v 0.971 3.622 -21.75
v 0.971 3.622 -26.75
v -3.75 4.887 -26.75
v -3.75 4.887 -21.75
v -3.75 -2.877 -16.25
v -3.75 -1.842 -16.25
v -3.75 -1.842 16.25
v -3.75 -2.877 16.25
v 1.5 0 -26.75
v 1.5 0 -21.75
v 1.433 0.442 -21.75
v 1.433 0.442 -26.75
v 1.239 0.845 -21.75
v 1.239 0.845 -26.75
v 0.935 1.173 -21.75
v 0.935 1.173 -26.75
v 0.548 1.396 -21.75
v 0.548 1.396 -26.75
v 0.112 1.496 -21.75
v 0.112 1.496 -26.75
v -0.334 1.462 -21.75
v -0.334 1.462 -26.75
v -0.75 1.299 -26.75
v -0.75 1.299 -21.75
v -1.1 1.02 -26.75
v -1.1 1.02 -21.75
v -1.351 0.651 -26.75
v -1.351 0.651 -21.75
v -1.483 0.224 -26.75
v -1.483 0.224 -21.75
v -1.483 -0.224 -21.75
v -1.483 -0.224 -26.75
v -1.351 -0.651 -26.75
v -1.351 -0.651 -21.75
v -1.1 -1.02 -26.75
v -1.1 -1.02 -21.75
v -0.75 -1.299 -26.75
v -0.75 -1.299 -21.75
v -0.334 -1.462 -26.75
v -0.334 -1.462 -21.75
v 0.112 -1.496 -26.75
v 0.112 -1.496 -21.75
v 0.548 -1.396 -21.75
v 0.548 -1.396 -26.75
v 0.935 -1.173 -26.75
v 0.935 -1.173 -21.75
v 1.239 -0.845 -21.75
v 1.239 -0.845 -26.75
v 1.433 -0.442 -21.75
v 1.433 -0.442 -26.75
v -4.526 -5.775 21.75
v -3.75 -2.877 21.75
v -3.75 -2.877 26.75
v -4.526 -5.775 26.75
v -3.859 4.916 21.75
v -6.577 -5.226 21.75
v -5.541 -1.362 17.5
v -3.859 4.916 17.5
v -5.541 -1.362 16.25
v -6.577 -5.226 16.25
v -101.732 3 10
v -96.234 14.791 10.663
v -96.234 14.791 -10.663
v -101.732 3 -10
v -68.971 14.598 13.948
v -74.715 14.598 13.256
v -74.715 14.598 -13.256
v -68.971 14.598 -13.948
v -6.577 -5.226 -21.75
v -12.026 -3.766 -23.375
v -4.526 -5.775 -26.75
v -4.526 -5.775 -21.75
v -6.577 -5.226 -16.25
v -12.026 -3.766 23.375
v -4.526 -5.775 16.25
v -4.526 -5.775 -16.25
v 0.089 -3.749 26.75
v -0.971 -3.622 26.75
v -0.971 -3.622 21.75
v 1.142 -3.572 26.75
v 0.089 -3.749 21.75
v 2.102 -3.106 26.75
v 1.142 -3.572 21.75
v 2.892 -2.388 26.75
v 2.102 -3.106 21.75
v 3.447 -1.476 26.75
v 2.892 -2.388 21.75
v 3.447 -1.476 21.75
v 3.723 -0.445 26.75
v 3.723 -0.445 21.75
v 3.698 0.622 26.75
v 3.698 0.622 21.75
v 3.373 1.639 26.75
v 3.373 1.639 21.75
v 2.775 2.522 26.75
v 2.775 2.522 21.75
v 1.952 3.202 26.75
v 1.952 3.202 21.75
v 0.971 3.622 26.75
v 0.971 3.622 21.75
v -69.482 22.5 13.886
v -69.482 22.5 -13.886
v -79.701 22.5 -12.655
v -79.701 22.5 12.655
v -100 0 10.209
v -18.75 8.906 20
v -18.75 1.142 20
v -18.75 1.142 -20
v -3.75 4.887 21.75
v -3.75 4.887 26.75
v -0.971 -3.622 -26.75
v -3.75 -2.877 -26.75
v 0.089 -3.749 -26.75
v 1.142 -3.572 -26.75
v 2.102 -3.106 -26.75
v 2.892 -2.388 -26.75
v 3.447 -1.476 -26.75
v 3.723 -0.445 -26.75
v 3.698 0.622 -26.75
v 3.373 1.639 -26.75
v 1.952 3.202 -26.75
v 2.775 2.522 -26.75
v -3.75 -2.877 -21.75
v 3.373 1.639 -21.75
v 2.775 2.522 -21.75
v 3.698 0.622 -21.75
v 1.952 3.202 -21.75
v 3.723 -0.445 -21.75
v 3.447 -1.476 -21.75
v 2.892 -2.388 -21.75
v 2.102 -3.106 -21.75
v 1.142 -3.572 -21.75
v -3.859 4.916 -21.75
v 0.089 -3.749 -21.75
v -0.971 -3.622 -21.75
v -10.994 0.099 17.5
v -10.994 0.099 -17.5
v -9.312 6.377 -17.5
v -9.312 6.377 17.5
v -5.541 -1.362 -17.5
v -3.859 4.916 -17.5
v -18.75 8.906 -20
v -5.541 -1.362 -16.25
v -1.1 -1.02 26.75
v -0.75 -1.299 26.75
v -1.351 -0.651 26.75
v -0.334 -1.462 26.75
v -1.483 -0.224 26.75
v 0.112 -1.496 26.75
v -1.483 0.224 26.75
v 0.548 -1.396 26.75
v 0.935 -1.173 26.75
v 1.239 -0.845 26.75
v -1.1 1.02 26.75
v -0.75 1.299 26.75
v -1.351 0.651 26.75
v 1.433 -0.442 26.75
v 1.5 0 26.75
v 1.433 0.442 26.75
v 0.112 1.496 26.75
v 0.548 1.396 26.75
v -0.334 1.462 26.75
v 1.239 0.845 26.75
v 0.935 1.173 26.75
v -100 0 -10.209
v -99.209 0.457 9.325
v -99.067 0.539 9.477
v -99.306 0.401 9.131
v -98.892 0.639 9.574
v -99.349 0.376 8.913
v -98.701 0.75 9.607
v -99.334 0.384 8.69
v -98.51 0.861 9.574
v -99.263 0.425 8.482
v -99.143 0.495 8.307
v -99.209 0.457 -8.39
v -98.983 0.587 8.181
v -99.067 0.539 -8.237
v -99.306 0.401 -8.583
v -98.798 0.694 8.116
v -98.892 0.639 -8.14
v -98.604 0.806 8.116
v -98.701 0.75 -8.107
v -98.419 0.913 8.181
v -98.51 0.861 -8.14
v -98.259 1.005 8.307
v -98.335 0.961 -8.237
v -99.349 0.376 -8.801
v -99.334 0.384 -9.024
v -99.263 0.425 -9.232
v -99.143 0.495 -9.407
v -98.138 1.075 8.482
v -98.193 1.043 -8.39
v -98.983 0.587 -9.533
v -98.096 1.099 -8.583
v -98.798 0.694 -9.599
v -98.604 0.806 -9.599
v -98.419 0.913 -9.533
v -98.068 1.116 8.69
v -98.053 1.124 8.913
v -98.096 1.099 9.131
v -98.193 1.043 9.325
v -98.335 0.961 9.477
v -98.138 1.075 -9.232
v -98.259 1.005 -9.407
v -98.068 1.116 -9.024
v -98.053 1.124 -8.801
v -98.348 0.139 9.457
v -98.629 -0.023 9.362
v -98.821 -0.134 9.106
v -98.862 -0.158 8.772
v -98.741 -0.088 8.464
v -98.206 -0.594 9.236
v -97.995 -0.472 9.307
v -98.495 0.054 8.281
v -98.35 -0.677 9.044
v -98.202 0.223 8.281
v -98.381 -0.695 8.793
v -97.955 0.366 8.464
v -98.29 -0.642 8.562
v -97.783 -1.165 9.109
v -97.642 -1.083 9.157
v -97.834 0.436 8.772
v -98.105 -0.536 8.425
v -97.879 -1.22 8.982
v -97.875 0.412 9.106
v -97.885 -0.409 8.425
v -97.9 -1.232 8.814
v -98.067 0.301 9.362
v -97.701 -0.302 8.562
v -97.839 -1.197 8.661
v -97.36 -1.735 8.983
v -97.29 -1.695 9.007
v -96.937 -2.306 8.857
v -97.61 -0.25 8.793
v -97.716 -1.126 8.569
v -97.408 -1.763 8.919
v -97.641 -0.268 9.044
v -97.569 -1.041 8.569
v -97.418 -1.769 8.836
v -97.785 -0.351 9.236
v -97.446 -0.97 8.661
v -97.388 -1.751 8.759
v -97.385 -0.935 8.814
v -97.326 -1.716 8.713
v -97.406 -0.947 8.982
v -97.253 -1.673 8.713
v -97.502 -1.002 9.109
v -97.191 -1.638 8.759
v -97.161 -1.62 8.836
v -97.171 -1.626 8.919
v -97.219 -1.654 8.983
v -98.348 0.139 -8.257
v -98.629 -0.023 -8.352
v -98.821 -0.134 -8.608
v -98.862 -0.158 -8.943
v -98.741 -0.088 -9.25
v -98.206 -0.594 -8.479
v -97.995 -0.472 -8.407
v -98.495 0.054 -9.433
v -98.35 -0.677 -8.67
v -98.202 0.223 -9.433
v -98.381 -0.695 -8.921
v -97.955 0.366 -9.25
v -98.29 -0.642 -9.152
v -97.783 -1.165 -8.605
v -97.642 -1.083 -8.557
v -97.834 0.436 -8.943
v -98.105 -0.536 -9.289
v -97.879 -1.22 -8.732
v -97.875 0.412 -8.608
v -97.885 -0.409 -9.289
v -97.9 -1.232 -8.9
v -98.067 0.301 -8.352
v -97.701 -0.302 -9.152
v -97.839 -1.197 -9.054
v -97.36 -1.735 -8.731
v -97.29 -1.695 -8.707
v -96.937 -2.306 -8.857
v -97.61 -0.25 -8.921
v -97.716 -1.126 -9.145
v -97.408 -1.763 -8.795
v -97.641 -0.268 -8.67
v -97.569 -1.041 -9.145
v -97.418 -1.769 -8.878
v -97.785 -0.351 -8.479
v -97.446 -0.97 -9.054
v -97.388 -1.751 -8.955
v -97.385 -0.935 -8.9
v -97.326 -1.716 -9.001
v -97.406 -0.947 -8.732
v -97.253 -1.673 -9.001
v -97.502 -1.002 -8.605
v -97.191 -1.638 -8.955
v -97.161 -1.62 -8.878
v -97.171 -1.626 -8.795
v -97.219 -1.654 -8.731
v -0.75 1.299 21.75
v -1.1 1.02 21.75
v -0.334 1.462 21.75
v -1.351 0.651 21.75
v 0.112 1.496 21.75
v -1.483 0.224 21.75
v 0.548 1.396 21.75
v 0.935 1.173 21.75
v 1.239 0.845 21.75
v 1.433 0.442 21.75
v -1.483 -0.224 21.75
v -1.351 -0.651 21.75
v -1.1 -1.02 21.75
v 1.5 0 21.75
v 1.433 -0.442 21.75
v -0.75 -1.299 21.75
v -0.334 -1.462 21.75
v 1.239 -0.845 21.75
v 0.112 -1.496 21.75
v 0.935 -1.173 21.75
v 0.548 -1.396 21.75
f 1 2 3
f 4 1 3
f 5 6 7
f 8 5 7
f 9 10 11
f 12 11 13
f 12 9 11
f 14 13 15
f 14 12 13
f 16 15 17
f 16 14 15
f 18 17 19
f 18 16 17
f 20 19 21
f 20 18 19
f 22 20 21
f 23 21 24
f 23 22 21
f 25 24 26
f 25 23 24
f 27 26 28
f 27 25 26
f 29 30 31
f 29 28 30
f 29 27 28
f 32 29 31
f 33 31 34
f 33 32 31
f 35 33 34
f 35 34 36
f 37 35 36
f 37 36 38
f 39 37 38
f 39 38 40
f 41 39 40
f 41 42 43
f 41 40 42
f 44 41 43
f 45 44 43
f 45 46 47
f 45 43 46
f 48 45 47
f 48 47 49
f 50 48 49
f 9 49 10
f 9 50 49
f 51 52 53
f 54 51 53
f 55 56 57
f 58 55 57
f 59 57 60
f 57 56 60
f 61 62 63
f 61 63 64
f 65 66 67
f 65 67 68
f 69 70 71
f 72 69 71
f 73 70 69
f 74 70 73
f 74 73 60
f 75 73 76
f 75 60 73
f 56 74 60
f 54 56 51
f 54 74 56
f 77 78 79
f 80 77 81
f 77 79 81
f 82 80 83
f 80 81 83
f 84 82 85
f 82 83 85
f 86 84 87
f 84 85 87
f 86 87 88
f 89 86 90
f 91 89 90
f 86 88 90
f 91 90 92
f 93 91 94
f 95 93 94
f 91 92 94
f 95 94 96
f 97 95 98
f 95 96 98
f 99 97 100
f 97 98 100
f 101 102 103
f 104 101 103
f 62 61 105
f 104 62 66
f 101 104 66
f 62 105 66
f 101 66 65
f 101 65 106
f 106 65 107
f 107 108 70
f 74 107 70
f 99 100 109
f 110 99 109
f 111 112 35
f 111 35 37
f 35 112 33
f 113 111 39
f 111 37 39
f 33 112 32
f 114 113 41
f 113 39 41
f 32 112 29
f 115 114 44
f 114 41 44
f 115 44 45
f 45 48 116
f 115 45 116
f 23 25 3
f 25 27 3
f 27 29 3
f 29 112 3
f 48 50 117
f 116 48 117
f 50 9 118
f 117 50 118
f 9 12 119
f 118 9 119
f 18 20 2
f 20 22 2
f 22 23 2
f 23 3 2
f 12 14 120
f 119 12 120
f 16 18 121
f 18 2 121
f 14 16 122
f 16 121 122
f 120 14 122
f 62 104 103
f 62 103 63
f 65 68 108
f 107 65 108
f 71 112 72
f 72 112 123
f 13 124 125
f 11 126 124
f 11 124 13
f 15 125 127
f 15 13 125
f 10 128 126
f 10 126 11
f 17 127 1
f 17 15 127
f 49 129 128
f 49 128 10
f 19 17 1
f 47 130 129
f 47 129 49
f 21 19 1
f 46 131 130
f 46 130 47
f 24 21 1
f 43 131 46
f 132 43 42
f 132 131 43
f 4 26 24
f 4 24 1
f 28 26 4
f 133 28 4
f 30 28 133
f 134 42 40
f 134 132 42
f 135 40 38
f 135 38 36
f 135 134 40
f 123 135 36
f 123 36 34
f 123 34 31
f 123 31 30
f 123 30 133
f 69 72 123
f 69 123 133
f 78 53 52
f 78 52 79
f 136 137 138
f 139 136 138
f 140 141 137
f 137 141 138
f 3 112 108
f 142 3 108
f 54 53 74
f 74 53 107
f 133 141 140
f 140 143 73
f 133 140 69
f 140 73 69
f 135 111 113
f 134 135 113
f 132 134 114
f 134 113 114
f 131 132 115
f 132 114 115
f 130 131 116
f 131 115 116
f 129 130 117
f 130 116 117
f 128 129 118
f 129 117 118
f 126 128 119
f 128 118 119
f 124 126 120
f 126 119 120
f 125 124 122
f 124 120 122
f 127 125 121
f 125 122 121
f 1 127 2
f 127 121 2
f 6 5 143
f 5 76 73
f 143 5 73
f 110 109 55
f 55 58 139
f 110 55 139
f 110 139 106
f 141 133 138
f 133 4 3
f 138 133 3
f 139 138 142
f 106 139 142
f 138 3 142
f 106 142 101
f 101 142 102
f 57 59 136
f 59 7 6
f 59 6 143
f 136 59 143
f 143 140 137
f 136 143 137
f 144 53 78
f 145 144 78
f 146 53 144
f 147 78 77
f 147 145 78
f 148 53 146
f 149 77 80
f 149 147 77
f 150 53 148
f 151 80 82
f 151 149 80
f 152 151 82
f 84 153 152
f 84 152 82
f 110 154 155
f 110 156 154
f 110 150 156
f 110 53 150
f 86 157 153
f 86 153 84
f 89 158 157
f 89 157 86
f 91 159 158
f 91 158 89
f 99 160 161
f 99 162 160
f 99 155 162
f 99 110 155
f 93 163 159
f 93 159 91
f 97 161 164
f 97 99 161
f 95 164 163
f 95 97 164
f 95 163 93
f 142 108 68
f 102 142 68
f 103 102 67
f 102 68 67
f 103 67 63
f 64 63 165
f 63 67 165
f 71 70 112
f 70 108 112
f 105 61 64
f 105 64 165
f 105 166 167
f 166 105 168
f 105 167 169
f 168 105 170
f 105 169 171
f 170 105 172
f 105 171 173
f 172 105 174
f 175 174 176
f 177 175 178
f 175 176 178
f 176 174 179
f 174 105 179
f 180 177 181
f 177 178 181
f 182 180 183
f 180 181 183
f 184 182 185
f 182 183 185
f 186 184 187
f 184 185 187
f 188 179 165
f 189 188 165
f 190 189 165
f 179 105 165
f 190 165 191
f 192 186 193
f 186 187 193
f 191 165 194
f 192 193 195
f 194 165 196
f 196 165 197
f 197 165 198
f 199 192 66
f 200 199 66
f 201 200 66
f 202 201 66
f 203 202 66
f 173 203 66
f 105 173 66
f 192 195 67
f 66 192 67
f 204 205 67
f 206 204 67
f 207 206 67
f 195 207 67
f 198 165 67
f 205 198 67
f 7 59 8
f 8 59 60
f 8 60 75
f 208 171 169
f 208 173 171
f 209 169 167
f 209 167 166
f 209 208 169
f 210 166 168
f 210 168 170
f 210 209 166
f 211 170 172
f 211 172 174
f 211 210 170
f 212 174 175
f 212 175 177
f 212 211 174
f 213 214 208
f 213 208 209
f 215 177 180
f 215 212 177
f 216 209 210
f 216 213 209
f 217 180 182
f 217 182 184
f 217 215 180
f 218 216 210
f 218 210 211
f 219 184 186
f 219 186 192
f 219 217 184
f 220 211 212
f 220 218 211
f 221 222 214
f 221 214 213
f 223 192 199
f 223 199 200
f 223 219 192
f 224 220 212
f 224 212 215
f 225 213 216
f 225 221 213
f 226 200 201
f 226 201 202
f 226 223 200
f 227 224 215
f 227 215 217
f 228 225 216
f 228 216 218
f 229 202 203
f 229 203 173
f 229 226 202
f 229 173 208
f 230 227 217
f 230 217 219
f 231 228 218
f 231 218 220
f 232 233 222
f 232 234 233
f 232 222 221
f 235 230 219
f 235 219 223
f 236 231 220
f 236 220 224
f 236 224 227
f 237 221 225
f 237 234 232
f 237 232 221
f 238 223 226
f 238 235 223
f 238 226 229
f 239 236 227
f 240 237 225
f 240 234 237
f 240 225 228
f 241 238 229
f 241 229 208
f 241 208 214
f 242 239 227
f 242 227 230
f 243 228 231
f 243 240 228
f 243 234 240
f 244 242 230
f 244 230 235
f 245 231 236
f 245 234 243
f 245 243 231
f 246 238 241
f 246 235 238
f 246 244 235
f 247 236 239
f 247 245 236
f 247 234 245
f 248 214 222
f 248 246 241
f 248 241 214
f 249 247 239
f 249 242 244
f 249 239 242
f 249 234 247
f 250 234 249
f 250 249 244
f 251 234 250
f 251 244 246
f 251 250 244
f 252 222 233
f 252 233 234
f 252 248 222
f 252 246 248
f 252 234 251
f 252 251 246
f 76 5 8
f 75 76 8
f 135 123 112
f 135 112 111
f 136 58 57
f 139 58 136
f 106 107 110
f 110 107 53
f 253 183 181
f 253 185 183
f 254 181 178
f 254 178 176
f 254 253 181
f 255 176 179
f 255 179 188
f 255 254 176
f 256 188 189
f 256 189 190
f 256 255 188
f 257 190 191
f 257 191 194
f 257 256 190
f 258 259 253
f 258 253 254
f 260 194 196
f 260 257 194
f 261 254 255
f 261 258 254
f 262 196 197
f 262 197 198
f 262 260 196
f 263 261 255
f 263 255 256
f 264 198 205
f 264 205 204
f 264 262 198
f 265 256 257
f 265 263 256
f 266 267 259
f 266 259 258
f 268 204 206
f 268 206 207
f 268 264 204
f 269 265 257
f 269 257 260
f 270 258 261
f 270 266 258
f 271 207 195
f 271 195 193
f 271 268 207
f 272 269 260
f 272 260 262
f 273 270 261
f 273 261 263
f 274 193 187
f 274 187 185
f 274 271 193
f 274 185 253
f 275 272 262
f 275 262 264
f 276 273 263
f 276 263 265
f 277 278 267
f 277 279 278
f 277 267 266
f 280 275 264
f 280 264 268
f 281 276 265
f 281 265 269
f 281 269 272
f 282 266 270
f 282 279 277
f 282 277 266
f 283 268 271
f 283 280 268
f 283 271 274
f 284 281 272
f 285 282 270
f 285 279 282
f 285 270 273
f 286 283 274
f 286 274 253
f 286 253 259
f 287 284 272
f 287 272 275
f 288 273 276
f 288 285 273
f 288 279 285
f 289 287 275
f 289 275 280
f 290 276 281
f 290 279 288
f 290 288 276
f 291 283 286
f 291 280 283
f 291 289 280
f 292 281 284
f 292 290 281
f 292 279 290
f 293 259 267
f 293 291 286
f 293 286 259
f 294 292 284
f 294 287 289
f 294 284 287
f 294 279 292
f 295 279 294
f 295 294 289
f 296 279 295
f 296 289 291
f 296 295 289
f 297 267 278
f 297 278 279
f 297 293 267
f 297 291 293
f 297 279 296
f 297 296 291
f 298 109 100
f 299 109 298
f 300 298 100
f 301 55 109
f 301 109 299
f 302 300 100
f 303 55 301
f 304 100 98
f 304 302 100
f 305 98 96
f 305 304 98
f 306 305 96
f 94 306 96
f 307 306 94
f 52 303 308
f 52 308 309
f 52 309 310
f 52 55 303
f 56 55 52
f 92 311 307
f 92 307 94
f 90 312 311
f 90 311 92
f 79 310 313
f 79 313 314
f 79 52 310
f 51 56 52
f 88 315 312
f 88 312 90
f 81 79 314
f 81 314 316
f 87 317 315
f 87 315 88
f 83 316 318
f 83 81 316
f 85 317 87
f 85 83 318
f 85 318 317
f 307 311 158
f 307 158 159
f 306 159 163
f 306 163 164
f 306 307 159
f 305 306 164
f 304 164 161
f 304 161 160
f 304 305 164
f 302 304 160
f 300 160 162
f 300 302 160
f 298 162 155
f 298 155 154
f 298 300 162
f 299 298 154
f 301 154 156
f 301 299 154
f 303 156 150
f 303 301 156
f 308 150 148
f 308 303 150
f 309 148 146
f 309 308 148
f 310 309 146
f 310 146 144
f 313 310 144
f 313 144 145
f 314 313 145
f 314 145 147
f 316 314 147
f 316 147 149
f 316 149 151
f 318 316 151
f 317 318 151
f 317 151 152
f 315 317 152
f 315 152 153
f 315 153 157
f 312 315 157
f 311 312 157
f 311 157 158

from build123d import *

# Parameters (mm, degrees)
BOSS_EXTRUDE2_DEPTH                  = 26.75
BOSS_EXTRUDE2_DEPTH_BACK             = 26.75
SKETCH3_R                            = 1.5
TOP_FORM_DEPTH                       = 108.569617744
TOP_FORM_DEPTH_BACK                  = 108.569617744
SKETCH12_OUTSIDE_W                   = 131.712
SKETCH12_OUTSIDE_H                   = 79.73
END_EXTRUDE_DEPTH                    = 26.75
END_EXTRUDE_DEPTH_BACK               = 26.75
SKETCH13_R                           = 1.5
SPRING_PHALANX_PLACE_DEPTH           = 8.038475773
SPRING_SUPPORT_DEPTH                 = 3
SPRING_SUPPORT_CORNER_CUT_DEPTH      = 108.569617744
SPRING_SUPPORT_CORNER_CUT_DEPTH_BACK = 108.569617744
SPRING_PLACE_CUT_DEPTH               = 17.5
SPRING_PLACE_CUT_DEPTH_BACK          = 17.5
PHALANX_SPACE_CUT_DEPTH              = 108.487219822
PHALANX_SPACE_CUT_DEPTH_BACK         = 108.487219822


with BuildPart() as part:
    # Sketch3 → Boss-Extrude2 (new, two sides: drawn at the far end of the back side and taken through both)
    with BuildSketch(Plane.XY.offset(-BOSS_EXTRUDE2_DEPTH_BACK)):
        with BuildLine():
            Line((0.970571419, 3.622221849), (-69.482255776, 22.5))
            Line((-69.482255776, 22.5), (-79.701126542, 22.5))
            Line((-79.701126542, 22.5), (-96.234008051, 14.790590741))
            Line((-96.234008051, 14.790590741), (-101.732050808, 3))
            Line((-101.732050808, 3), (-100, 0))
            Line((-100, 0), (-74.714962449, 14.598323237))
            Line((-74.714962449, 14.598323237), (-68.970571419, 14.598323237))
            Line((-68.970571419, 14.598323237), (-0.970571419, -3.622221849))
            ThreePointArc((-0.970571419, -3.622221849), (3.622221849, -0.970571419), (0.970571419, 3.622221849))
        make_face()
        Circle(SKETCH3_R, mode=Mode.SUBTRACT)
    extrude(amount=BOSS_EXTRUDE2_DEPTH + BOSS_EXTRUDE2_DEPTH_BACK)

    # Sketch12 outside → top-form (cut, two sides: drawn at the far end of the back side and taken through both)
    with BuildSketch(Plane(origin=(0, 0, 0), x_dir=(1, 0, 0), z_dir=(0, 1, 0)).offset(-TOP_FORM_DEPTH_BACK)):
        with Locations((-48.991, 0)):
            Rectangle(SKETCH12_OUTSIDE_W, SKETCH12_OUTSIDE_H)
        Polygon((-101.732050808, 10), (-101.732050808, -10), (-18.75, -20), (-3.75, -26.75), (-3.75, 26.75), (-18.75, 20), align=None, mode=Mode.SUBTRACT)
    extrude(amount=TOP_FORM_DEPTH + TOP_FORM_DEPTH_BACK, mode=Mode.SUBTRACT)

    # Sketch13 → end-extrude (add, two sides: drawn at the far end of the back side and taken through both)
    with BuildSketch(Plane.XY.offset(-END_EXTRUDE_DEPTH_BACK)):
        with BuildLine():
            Line((-3.75, 4.887095148), (-3.75, -2.877476205))
            Line((-3.75, -2.877476205), (-0.970571419, -3.622221849))
            ThreePointArc((-0.970571419, -3.622221849), (3.622221849, -0.970571419), (0.970571419, 3.622221849))
            Line((0.970571419, 3.622221849), (-3.75, 4.887095148))
        make_face()
        Circle(SKETCH13_R, mode=Mode.SUBTRACT)
    extrude(amount=END_EXTRUDE_DEPTH + END_EXTRUDE_DEPTH_BACK)

    # Sketch16 → spring_phalanx_place (cut, along a direction that is not the sketch's normal)
    with BuildSketch(Plane(origin=(0.970571419, 3.622221849, 0), x_dir=(0.9659258262890683, -0.2588190451025211, 0), z_dir=(0.2588190451025211, 0.9659258262890683, 0))):
        Polygon((-4.887095148, 0), (-4.887095148, -21.75), (0, -21.75), (0, 21.75), (-4.887095148, 21.75), align=None)
        Polygon((0, 21.75), (0, -21.75), (3.75, -21.75), (3.75, 0), (3.75, 21.75), align=None)
    extrude(amount=-SPRING_PHALANX_PLACE_DEPTH, dir=(0, 1, 0), mode=Mode.SUBTRACT)

    # spikes cone 1 section (through the dimple's axis) → spikes (revolve)
    with BuildSketch(Plane(origin=(-98.700961894, 0.75, 8.857123826), x_dir=(0, 0, 1), z_dir=(0.866025404, 0.5, 0))):
        Polygon((0, 0), (0.75, 0), (0, 3.528472582), align=None)
    revolve(axis=Axis((-98.700961894, 0.75, 8.857123826), (0.5, -0.866025404, 0)))

    # spikes cone 2 section (through the dimple's axis) → spikes cone 2 (revolve)
    with BuildSketch(Plane(origin=(-98.700961894, 0.75, -8.857123826), x_dir=(0, 0, 1), z_dir=(0.866025404, 0.5, 0))):
        Polygon((0, 0), (0.75, 0), (0, 3.528472582), align=None)
    revolve(axis=Axis((-98.700961894, 0.75, -8.857123826), (0.5, -0.866025404, 0)))

    # Sketch18 → spring-support (add)
    with BuildSketch(Plane(origin=(-0.970571419, -3.622221849, 0), x_dir=(0.9659258262890681, -0.2588190451025214, 0), z_dir=(-0.2588190451025214, -0.9659258262890681, 0))):
        Polygon((-2.877476205, 21.75), (-2.877476205, 26.75), (-18.406618911, 20), (-18.406618911, -20), (-2.877476205, -26.75), (-2.877476205, -21.75), align=None)
    extrude(amount=SPRING_SUPPORT_DEPTH)

    # Sketch22 → spring-support-corner-cut (cut, two sides: drawn at the far end of the back side and taken through both)
    with BuildSketch(Plane.XY.offset(-SPRING_SUPPORT_CORNER_CUT_DEPTH_BACK)):
        Polygon((-19.526457135, -1.756015797), (-18.75, 1.141761682), (-12.026457135, -3.765634741), align=None)
    extrude(amount=SPRING_SUPPORT_CORNER_CUT_DEPTH + SPRING_SUPPORT_CORNER_CUT_DEPTH_BACK, mode=Mode.SUBTRACT)

    # Sketch22<3> → spring-place-cut (cut, two sides: drawn at the far end of the back side and taken through both)
    with BuildSketch(Plane.XY.offset(-SPRING_PLACE_CUT_DEPTH_BACK)):
        Polygon((-3.75, -1.842200025), (-10.994443697, 0.098942814), (-8.406253246, 9.758201077), (-3.75, 8.51056178), align=None)
    extrude(amount=SPRING_PLACE_CUT_DEPTH + SPRING_PLACE_CUT_DEPTH_BACK, mode=Mode.SUBTRACT)

    # Sketch21 → phalanx-space-cut (cut, two sides: drawn at the far end of the back side and taken through both)
    with BuildSketch(Plane(origin=(-0.711752374, -2.656296022, 0), x_dir=(0.9659258262890681, -0.2588190451025214, 0), z_dir=(0.2588190451025214, 0.9659258262890681, 0)).offset(-PHALANX_SPACE_CUT_DEPTH_BACK)):
        Polygon((-4.887095148, 21.75), (0, 21.75), (0, 16.25), (-5, 16.25), (-5, 21.75), align=None)
        Polygon((-4.887095148, -21.75), (-5, -21.75), (-5, -16.25), (0, -16.25), (0, -21.75), align=None)
    extrude(amount=PHALANX_SPACE_CUT_DEPTH + PHALANX_SPACE_CUT_DEPTH_BACK, mode=Mode.SUBTRACT)


solid = part.part
